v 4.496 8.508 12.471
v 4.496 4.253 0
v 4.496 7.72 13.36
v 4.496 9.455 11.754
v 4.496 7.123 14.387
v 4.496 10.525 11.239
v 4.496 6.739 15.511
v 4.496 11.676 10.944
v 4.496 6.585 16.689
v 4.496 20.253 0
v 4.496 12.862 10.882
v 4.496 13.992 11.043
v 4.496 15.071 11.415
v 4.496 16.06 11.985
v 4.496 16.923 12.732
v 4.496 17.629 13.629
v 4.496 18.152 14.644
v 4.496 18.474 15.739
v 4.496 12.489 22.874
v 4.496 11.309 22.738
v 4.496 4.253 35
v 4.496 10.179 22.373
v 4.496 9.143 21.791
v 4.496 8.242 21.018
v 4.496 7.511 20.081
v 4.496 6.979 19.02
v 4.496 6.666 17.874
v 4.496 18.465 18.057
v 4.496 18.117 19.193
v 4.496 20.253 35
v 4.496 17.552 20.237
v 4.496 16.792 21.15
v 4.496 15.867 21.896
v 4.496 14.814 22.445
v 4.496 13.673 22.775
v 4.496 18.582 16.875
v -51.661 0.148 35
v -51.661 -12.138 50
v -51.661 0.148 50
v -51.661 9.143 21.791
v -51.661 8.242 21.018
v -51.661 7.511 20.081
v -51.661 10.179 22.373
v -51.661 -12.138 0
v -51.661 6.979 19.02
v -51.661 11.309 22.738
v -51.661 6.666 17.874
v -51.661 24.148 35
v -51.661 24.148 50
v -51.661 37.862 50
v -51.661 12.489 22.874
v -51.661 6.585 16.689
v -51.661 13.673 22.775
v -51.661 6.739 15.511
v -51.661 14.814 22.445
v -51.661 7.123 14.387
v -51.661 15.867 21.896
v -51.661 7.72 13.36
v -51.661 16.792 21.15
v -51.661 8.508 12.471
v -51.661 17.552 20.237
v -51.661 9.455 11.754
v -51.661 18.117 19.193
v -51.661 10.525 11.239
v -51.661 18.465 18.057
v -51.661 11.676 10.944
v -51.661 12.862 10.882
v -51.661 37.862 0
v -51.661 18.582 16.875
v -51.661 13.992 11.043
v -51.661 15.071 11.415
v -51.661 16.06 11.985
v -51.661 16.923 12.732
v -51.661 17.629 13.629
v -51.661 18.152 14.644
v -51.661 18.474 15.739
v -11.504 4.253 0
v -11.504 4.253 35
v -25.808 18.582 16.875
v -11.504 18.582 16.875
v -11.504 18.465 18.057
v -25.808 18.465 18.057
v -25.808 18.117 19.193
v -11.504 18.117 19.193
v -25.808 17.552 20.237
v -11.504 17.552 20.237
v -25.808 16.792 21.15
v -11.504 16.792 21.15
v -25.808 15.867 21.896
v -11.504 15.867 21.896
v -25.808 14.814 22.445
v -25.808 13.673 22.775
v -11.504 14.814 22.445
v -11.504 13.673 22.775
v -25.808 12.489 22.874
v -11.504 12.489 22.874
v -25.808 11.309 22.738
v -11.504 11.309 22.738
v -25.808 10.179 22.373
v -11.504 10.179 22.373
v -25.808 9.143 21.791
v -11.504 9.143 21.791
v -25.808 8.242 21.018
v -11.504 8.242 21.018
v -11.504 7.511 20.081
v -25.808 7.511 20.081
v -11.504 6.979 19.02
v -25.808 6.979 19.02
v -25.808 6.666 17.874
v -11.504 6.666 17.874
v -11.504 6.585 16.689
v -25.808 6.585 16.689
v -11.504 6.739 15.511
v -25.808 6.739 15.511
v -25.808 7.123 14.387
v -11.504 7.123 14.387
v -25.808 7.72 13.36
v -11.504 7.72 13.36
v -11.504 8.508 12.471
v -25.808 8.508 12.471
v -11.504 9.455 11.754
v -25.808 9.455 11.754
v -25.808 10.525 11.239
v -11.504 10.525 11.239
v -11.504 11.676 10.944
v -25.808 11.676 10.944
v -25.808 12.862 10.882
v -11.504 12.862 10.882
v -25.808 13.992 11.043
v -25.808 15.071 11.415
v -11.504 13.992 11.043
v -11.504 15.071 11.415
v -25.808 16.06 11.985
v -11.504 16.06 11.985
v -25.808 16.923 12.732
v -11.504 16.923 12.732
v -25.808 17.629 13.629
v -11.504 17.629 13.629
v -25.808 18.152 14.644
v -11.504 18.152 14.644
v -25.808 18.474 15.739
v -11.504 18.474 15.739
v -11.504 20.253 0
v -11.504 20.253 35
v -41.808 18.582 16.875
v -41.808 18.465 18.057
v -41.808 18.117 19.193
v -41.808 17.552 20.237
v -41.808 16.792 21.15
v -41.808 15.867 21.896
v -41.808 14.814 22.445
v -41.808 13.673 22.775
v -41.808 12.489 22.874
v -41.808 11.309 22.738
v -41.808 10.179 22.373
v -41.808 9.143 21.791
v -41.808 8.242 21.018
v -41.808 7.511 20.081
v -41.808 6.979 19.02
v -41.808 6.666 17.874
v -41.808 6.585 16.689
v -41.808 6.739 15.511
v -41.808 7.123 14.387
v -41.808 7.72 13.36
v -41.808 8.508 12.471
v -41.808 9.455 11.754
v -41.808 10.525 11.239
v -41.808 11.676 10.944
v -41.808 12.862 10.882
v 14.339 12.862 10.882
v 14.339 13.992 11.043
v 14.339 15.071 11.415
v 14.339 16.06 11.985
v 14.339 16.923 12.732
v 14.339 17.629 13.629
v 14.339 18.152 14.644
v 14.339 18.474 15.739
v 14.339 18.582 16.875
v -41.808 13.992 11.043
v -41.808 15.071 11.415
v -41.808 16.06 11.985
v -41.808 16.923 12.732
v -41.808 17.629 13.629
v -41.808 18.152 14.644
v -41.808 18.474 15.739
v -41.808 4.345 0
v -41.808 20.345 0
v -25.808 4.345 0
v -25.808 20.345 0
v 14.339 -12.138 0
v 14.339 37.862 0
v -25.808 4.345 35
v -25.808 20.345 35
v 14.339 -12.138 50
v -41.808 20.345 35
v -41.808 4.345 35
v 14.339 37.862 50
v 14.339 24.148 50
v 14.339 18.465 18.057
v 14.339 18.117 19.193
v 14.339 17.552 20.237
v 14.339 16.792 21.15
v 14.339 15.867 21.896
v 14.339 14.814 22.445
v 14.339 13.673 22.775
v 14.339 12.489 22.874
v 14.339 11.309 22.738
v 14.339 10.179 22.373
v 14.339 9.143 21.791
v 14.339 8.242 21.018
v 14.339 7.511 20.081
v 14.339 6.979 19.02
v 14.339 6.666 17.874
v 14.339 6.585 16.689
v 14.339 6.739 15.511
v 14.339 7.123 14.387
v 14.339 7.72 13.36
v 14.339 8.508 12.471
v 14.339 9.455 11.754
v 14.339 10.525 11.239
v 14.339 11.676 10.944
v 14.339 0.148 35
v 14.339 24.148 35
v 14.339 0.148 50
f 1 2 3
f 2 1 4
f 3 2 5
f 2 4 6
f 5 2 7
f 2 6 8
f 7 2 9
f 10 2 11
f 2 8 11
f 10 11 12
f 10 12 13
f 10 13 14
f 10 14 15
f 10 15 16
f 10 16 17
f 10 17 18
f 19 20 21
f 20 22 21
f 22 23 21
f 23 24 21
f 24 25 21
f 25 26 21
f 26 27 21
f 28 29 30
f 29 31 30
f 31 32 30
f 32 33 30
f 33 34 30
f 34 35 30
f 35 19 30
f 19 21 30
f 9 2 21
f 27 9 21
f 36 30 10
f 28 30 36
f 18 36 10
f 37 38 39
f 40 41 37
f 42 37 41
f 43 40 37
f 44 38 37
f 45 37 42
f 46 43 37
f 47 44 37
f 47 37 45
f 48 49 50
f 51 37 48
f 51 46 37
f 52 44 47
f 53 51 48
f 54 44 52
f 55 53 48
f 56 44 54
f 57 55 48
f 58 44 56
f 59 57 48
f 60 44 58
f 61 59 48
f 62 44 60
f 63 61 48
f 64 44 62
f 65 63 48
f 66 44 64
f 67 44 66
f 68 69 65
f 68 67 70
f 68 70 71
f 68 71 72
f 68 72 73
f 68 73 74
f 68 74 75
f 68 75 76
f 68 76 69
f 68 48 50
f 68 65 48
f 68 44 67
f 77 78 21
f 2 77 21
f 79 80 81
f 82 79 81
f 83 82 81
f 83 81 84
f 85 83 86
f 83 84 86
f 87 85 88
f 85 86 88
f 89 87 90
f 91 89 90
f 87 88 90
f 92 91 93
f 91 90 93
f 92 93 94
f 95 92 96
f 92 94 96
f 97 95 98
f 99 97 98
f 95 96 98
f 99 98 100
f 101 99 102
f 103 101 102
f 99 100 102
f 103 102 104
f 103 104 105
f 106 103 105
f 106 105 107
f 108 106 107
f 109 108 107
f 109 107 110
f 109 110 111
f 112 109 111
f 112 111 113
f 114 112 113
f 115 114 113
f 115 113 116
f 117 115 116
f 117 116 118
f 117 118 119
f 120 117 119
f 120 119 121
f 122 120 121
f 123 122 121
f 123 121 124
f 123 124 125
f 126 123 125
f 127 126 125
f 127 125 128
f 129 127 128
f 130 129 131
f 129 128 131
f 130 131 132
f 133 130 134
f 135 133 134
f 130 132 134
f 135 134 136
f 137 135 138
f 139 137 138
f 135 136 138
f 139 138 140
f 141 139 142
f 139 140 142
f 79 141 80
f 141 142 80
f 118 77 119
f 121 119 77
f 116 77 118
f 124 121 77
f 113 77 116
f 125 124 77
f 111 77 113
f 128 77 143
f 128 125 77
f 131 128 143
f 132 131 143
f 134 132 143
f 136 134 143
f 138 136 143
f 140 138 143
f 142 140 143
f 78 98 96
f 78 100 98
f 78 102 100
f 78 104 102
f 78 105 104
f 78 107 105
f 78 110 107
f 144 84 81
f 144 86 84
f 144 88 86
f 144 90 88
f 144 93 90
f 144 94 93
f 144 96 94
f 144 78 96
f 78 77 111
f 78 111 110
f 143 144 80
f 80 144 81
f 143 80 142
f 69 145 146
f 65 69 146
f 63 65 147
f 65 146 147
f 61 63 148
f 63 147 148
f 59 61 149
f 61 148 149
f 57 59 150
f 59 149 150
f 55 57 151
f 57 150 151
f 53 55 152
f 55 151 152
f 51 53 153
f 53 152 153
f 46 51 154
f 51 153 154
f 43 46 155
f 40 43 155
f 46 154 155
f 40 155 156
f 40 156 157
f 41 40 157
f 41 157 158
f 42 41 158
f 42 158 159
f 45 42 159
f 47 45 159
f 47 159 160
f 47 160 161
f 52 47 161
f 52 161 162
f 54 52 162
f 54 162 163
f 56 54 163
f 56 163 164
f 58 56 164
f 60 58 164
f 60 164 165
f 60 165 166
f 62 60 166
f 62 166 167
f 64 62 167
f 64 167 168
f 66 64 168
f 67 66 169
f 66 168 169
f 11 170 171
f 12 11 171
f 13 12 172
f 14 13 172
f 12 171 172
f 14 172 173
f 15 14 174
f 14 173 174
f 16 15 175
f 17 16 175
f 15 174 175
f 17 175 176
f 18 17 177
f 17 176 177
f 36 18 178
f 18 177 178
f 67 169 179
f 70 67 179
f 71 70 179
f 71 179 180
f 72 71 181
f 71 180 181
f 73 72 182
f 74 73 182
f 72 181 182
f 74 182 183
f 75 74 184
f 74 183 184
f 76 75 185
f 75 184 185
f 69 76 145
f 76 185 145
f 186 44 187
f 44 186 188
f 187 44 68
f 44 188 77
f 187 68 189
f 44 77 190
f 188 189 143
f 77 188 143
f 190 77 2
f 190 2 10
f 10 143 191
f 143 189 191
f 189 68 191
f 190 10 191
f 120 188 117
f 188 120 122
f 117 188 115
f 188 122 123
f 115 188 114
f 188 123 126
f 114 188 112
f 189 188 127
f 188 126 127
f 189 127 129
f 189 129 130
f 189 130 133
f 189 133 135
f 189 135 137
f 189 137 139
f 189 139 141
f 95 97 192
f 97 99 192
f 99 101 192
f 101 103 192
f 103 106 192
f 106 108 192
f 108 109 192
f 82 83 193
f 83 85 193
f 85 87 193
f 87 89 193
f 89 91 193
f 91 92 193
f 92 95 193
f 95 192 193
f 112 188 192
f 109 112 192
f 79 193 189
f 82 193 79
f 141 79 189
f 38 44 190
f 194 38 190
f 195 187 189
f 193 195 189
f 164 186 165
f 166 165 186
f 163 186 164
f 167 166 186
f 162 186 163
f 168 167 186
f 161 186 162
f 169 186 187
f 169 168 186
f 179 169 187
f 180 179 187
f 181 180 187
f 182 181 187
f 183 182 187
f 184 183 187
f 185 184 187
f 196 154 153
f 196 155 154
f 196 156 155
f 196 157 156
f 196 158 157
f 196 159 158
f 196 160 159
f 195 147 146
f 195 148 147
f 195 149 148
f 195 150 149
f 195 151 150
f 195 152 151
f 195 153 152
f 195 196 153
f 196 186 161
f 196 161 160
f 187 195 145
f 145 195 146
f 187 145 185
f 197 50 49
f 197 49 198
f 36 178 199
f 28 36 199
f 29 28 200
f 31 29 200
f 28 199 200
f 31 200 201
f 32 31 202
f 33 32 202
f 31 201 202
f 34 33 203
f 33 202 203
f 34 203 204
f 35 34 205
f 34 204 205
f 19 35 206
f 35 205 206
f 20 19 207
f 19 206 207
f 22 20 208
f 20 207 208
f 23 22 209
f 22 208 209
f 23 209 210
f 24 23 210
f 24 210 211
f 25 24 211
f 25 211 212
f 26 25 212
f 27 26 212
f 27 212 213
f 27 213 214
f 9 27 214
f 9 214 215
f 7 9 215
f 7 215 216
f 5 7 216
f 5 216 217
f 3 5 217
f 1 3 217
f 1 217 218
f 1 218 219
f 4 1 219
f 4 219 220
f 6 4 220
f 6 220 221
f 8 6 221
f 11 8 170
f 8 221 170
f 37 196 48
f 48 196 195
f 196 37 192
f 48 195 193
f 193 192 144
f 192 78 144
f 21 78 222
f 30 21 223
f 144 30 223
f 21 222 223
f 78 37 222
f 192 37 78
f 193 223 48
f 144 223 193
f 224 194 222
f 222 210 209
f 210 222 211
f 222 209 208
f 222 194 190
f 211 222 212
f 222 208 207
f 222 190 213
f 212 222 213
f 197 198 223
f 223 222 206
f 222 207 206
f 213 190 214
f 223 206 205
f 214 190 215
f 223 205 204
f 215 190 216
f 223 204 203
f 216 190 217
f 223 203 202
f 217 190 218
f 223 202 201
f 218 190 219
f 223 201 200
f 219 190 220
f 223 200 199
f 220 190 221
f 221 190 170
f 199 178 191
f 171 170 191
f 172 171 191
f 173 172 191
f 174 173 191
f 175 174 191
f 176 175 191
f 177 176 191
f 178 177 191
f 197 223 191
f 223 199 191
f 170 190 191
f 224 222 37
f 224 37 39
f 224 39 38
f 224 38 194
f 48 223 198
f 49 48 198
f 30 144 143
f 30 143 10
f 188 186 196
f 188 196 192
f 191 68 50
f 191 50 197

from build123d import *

# Parameters (mm, degrees)
F0_W     = 66
F0_H     = 50
F1_DEPTH = 50
F2_W     = 24
F2_H     = 15
F3_DEPTH = 66
F6_DEPTH = 66
F7_W     = 16
F7_H     = 16
F8_DEPTH = 50


with BuildPart() as f1:
    # F0 (on Top) → F1 (new body)
    with BuildSketch(Plane.XY):
        with Locations((-18.661186, 12.861842)):
            Rectangle(F0_W, F0_H)
    extrude(amount=F1_DEPTH)

    # F2 (on face) → F3 (cut)
    with BuildSketch(Plane.YZ.offset(14.338814)):
        with Locations((12.148024, 42.5)):
            Rectangle(F2_W, F2_H)
    extrude(amount=-F3_DEPTH, mode=Mode.SUBTRACT)

    # F5 (on face) → F6 (cut)
    with BuildSketch(Plane.YZ.offset(14.338814)):
        with BuildLine():
            ThreePointArc((12.861842, 10.881519), (16.922608, 12.732394), (18.582238, 16.875001))
            ThreePointArc((18.582238, 16.875001), (8.241868, 21.017607), (12.861842, 10.881519))
        make_face()
    extrude(amount=-F6_DEPTH, mode=Mode.SUBTRACT)

    # F7 (on face) → F8 (cut)
    with BuildSketch(Plane.XY.offset(35)):
        with Locations((-33.807651, 12.345139)):
            Rectangle(F7_W, F7_H)
        with Locations((-3.504306, 12.252815)):
            Rectangle(F7_W, F7_H)
    extrude(amount=-F8_DEPTH, mode=Mode.SUBTRACT)


solid = f1.part
